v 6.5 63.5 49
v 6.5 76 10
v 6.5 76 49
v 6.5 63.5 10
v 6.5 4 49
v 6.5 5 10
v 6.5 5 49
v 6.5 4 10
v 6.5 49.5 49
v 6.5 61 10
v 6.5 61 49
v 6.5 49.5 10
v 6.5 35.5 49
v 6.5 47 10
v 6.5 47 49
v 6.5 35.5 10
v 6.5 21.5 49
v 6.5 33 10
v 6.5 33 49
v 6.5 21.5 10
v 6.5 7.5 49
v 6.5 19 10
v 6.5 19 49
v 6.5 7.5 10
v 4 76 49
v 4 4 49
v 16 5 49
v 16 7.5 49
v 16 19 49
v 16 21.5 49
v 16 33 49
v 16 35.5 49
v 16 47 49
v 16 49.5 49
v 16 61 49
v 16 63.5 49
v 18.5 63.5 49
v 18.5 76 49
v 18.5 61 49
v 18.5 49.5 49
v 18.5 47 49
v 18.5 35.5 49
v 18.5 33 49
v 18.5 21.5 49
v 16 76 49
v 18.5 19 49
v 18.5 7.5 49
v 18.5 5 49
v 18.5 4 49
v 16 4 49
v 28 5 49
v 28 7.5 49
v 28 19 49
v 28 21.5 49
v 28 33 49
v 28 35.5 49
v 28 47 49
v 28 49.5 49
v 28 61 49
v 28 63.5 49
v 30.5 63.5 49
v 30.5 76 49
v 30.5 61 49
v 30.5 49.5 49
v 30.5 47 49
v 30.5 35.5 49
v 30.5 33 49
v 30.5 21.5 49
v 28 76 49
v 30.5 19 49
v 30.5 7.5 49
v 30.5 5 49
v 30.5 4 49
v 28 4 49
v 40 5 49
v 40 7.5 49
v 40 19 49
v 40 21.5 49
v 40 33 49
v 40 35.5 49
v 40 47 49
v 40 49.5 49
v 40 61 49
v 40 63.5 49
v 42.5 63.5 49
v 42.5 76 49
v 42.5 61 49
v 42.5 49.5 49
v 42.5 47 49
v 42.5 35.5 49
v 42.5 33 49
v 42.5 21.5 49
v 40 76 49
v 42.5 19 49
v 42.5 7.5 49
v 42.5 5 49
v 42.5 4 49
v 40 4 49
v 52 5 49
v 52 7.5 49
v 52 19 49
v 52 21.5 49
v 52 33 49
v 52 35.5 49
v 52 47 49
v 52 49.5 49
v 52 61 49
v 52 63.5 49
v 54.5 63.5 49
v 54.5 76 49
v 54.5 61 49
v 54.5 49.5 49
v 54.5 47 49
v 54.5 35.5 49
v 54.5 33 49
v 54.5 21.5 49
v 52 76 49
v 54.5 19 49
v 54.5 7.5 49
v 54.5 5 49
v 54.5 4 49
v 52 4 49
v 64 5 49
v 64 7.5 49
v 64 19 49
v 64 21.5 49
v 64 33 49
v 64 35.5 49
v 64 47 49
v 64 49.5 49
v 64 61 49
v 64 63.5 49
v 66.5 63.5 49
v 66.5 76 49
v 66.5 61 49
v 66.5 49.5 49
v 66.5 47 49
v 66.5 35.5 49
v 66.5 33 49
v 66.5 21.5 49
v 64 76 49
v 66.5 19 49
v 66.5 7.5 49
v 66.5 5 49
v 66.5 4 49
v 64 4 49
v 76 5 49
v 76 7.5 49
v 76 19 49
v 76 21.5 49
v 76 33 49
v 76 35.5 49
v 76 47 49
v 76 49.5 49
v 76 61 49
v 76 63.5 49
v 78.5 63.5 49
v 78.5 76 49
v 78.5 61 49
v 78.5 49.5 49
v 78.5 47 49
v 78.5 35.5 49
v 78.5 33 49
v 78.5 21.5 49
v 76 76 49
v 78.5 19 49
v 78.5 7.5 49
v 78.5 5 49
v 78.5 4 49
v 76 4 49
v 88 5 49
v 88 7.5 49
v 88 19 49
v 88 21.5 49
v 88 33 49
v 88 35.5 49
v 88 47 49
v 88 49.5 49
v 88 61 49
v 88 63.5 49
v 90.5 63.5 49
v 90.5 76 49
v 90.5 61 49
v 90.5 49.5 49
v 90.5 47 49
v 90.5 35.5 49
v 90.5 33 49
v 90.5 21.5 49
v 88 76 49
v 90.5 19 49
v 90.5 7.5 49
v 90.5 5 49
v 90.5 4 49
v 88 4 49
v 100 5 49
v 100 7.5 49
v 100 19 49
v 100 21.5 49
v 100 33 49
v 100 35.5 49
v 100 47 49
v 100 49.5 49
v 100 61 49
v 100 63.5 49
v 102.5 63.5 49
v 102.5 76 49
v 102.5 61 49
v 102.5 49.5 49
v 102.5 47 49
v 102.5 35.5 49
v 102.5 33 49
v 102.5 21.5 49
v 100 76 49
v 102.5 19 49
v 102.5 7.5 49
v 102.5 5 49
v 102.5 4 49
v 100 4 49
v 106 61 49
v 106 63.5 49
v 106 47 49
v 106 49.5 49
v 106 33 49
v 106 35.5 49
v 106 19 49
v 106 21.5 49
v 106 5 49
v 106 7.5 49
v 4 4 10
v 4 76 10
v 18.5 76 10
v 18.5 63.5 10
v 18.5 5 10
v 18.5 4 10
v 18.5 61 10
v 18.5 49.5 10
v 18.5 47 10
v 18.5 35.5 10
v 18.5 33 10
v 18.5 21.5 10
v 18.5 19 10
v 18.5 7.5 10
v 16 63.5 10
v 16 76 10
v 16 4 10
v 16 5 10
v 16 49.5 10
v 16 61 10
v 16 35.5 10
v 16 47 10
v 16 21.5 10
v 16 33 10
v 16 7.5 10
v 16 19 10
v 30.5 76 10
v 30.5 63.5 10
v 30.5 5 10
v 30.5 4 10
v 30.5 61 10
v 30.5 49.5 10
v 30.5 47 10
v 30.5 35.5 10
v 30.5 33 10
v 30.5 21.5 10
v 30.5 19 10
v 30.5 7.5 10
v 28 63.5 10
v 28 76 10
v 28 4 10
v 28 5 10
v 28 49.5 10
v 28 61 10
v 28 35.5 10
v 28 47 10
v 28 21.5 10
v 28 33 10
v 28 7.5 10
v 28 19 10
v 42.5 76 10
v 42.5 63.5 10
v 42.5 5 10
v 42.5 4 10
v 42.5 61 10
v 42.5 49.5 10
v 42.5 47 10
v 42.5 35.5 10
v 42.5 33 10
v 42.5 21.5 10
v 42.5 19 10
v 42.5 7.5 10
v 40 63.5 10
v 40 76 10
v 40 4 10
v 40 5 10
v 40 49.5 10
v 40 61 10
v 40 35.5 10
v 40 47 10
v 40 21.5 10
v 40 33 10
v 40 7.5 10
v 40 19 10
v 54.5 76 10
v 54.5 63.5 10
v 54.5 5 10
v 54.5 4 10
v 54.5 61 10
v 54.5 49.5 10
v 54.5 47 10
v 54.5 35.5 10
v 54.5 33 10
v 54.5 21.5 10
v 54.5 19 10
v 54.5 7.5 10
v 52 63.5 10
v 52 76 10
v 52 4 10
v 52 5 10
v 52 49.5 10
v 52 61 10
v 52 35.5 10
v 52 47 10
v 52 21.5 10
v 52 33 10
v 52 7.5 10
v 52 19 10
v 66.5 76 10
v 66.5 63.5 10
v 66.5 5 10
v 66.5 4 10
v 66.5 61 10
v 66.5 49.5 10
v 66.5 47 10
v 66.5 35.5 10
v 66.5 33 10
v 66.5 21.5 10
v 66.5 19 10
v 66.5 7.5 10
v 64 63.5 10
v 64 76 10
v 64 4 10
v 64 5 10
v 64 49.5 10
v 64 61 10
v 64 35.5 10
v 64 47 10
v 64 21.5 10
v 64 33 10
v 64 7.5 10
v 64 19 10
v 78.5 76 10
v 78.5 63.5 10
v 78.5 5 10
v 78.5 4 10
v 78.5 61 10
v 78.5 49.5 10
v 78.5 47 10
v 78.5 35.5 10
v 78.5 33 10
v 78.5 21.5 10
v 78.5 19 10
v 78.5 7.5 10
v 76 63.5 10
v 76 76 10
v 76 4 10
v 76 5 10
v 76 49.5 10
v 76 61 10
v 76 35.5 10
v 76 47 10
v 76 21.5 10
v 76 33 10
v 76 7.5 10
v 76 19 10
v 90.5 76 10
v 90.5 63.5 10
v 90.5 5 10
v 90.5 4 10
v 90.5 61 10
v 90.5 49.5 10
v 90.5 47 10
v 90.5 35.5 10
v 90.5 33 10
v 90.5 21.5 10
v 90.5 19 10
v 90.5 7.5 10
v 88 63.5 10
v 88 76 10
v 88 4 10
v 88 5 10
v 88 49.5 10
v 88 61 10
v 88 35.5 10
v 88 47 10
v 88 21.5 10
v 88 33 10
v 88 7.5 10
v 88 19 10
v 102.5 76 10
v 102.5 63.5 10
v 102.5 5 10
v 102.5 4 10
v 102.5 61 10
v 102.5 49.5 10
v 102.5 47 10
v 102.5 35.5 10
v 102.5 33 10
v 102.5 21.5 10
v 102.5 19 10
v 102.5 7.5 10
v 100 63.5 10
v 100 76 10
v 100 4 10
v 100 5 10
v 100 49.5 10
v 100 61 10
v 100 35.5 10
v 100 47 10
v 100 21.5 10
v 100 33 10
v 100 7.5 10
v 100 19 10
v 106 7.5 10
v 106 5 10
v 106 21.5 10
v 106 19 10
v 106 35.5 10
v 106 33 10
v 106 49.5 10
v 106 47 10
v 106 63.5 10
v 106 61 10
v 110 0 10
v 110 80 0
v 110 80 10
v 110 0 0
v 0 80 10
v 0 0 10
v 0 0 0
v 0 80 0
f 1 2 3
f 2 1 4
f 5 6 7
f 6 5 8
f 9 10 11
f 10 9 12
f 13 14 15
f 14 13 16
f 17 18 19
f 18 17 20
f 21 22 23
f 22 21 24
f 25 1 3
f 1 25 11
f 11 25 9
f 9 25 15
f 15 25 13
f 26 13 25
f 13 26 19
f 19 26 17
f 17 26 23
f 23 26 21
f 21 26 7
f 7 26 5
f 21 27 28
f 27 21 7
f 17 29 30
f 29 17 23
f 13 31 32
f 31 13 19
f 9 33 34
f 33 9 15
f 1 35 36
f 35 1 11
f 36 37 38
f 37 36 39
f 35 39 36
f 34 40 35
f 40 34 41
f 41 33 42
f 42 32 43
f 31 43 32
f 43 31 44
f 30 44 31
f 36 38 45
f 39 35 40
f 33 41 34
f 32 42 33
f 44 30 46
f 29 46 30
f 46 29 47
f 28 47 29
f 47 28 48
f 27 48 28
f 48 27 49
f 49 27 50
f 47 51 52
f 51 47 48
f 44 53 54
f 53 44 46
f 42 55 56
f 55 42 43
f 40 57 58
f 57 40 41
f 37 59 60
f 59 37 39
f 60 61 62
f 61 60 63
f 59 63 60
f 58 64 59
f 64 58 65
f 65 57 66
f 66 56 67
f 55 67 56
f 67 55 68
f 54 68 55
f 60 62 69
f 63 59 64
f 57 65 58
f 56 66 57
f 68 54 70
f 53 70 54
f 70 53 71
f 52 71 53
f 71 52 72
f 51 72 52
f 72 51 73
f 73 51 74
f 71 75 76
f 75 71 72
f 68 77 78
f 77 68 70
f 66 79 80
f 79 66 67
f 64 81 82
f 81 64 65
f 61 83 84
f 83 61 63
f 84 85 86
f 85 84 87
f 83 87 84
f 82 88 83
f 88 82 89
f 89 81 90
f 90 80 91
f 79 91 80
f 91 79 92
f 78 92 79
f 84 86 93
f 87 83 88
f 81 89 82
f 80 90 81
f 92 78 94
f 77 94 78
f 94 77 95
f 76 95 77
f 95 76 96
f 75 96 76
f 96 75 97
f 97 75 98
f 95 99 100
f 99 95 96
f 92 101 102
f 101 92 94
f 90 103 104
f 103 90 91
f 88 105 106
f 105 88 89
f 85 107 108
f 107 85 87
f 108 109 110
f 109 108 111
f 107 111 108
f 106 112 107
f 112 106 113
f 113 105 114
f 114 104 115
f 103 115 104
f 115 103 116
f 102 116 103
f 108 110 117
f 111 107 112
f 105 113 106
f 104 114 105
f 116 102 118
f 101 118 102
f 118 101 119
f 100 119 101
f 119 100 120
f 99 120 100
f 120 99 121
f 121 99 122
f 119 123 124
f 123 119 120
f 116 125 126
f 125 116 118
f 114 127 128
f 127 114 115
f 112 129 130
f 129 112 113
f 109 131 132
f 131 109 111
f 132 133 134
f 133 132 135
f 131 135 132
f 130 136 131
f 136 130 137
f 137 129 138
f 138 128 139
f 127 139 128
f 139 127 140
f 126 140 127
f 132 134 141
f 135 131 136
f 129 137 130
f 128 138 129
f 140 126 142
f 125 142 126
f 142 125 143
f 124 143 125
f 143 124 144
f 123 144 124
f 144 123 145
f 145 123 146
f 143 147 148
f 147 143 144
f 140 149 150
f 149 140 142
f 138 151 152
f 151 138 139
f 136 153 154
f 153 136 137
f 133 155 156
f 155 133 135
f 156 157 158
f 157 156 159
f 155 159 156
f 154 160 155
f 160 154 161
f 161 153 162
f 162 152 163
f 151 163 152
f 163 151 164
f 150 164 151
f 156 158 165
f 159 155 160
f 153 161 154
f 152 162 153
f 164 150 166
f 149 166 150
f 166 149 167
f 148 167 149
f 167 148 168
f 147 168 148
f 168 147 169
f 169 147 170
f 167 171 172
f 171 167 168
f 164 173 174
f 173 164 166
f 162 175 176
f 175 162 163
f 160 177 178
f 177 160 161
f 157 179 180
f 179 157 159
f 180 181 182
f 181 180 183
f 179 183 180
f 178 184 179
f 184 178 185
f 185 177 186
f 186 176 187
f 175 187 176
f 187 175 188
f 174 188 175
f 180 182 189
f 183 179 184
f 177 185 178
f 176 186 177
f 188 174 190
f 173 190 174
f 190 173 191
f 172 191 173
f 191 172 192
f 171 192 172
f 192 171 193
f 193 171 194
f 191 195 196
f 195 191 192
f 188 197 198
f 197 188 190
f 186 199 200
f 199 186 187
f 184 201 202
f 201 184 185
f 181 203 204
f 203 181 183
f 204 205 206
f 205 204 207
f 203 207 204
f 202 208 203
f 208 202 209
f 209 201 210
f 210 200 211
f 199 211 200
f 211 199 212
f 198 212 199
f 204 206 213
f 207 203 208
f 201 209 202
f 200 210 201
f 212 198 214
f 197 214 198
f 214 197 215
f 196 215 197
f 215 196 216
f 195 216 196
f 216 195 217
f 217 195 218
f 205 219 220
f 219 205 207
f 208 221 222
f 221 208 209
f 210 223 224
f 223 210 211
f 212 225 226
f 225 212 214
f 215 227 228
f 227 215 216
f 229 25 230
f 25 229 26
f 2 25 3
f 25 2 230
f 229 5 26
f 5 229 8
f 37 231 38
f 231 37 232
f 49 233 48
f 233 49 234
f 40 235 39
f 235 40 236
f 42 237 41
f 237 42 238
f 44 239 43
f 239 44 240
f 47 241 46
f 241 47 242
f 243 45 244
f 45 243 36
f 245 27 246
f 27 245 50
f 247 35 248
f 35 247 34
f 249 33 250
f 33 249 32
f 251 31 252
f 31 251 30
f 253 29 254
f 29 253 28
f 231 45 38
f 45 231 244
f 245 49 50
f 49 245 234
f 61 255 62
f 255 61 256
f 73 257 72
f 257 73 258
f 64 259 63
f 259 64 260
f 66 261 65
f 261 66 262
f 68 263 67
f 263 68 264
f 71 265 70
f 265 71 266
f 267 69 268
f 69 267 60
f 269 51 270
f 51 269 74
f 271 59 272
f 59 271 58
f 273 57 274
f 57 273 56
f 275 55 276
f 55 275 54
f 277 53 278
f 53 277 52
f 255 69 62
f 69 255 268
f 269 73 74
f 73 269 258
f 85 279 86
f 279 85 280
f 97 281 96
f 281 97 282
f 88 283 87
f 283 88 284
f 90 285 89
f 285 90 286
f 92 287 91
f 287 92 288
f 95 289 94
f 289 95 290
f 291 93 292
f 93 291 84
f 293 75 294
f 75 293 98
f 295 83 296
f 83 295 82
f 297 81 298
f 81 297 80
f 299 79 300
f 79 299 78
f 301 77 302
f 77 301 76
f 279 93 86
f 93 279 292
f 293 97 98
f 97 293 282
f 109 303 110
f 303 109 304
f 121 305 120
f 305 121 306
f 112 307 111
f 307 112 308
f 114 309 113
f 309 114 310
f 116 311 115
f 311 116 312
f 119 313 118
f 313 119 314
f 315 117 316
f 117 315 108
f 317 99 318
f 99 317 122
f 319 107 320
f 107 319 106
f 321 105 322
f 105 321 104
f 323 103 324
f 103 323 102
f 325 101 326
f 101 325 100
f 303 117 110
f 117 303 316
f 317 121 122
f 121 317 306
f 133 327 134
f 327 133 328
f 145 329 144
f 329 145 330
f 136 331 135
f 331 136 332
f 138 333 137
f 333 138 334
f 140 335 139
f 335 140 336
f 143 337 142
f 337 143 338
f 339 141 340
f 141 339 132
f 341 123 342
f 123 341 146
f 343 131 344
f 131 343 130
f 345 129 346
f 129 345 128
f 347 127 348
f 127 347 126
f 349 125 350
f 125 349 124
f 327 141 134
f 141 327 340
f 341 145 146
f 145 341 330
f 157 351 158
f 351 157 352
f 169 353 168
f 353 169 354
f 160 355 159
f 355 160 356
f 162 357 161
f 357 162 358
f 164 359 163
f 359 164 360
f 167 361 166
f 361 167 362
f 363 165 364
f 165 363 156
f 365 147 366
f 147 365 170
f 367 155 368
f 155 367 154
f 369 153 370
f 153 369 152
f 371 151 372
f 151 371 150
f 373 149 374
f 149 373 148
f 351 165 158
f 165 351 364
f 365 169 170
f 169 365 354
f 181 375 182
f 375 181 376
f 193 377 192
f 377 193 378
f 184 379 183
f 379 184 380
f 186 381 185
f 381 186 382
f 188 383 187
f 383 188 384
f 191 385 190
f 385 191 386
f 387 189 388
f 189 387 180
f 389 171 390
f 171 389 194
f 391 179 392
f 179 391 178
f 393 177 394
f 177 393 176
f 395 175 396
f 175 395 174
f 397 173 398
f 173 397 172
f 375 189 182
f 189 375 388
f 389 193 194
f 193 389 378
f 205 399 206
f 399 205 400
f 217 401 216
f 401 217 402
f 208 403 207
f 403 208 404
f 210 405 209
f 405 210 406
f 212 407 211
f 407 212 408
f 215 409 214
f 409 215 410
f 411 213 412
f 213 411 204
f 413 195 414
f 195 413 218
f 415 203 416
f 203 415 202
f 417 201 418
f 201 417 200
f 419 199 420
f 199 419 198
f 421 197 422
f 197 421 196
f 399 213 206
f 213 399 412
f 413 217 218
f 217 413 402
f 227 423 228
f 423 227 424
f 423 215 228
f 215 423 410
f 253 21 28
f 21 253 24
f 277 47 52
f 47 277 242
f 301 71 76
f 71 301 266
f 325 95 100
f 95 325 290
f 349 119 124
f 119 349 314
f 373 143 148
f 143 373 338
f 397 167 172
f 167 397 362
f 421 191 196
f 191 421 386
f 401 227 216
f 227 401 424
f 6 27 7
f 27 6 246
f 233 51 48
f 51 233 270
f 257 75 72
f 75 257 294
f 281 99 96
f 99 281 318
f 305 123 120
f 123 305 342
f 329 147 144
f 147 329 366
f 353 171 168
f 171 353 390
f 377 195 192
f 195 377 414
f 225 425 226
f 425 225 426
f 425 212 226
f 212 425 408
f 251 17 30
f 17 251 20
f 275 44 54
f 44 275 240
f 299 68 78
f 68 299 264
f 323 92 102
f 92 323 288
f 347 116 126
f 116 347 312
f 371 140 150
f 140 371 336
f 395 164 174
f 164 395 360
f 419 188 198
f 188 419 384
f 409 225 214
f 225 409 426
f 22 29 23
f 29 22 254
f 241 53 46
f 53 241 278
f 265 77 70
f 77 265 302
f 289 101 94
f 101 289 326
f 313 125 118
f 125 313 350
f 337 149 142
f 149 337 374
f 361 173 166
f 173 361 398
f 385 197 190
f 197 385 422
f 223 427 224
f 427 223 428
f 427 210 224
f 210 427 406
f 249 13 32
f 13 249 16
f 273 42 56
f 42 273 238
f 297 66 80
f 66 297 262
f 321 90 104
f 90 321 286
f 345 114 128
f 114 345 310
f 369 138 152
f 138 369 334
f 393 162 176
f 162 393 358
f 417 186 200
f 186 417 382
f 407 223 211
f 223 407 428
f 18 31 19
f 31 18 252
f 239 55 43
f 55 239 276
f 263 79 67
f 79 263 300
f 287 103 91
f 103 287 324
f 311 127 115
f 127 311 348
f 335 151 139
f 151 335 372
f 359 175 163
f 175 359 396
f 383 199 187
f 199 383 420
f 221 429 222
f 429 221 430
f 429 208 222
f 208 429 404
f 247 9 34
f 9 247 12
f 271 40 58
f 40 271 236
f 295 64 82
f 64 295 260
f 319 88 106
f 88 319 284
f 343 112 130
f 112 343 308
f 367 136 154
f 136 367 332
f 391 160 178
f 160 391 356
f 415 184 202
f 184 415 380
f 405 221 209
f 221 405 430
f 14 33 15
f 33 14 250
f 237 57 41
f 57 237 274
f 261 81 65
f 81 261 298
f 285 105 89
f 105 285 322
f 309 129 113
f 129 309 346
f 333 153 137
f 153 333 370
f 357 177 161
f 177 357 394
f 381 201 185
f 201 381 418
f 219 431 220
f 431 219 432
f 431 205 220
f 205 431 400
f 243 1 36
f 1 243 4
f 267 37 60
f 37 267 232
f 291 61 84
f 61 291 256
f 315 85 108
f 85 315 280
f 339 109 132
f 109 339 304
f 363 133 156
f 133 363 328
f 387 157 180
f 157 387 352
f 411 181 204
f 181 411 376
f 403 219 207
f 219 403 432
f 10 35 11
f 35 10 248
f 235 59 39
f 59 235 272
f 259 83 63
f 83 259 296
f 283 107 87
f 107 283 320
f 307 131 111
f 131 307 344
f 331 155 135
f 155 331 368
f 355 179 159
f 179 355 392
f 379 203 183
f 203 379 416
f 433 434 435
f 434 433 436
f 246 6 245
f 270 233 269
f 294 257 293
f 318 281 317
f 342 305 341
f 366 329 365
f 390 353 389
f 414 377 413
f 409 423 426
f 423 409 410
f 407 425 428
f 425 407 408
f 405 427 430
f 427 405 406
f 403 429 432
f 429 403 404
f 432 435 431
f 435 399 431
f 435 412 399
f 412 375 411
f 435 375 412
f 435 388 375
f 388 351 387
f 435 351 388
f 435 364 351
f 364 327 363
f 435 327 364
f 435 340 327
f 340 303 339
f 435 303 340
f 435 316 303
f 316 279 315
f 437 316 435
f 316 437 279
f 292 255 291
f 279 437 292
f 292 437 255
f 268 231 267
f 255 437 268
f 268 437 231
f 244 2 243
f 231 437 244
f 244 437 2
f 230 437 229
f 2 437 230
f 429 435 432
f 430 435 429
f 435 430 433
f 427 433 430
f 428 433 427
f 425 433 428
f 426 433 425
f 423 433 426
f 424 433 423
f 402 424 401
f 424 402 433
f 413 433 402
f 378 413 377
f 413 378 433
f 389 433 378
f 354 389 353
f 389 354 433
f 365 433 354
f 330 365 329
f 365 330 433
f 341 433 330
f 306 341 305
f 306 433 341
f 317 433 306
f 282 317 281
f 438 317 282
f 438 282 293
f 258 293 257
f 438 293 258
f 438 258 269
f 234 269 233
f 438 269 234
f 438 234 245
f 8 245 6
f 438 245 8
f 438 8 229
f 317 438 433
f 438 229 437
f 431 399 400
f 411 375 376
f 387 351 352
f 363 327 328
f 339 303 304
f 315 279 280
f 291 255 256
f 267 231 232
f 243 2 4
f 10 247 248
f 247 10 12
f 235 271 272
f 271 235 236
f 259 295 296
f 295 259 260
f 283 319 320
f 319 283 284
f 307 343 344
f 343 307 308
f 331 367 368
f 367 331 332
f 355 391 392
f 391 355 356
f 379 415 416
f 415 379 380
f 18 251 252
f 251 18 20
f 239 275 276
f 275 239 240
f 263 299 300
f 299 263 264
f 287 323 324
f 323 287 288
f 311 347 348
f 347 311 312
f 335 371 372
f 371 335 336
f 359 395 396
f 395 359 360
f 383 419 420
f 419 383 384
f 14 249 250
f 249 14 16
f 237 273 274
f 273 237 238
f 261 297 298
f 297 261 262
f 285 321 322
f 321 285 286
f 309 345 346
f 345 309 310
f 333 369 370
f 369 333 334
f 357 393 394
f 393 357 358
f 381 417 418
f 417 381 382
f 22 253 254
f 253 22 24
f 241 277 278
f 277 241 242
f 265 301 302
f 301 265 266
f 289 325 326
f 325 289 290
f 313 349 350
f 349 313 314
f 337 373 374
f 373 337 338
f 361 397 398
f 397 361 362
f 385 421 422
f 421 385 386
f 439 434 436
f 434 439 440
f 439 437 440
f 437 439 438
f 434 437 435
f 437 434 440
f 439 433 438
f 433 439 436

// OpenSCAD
$fn = 32;

// ----------------------------------------------------------------------
// Heatsink: cross fin block
// ----------------------------------------------------------------------

// --- parameters (mm) ---
base_l = 110;             // base length, X
base_w = 80;              // base width, Y
base_t = 10;              // base plate thickness
fin_h = 40;               // fin height above the base
fin_t = 2.5;              // fin thickness
edge = 4;                 // margin from the base ends
pitch = 12;               // fin pitch
rib_pitch = 14;           // cross rib pitch

n_fins = floor((base_l - 2 * edge - fin_t) / pitch) + 1;  // fin count
total_h = base_t + fin_h - 1;  // overall height
n_ribs = floor((base_w - 2 * edge) / rib_pitch);  // rib count

union() {
  cube([base_l, base_w, base_t]);
  for (i = [0 : n_fins - 1])
    translate([edge + i * pitch, edge, base_t - 1])
      cube([fin_t, base_w - 2 * edge, fin_h]);
  for (i = [0 : n_ribs - 1])
    translate([edge, edge + 1 + i * rib_pitch, base_t - 1])
      cube([base_l - 2 * edge, fin_t, fin_h]);
}
